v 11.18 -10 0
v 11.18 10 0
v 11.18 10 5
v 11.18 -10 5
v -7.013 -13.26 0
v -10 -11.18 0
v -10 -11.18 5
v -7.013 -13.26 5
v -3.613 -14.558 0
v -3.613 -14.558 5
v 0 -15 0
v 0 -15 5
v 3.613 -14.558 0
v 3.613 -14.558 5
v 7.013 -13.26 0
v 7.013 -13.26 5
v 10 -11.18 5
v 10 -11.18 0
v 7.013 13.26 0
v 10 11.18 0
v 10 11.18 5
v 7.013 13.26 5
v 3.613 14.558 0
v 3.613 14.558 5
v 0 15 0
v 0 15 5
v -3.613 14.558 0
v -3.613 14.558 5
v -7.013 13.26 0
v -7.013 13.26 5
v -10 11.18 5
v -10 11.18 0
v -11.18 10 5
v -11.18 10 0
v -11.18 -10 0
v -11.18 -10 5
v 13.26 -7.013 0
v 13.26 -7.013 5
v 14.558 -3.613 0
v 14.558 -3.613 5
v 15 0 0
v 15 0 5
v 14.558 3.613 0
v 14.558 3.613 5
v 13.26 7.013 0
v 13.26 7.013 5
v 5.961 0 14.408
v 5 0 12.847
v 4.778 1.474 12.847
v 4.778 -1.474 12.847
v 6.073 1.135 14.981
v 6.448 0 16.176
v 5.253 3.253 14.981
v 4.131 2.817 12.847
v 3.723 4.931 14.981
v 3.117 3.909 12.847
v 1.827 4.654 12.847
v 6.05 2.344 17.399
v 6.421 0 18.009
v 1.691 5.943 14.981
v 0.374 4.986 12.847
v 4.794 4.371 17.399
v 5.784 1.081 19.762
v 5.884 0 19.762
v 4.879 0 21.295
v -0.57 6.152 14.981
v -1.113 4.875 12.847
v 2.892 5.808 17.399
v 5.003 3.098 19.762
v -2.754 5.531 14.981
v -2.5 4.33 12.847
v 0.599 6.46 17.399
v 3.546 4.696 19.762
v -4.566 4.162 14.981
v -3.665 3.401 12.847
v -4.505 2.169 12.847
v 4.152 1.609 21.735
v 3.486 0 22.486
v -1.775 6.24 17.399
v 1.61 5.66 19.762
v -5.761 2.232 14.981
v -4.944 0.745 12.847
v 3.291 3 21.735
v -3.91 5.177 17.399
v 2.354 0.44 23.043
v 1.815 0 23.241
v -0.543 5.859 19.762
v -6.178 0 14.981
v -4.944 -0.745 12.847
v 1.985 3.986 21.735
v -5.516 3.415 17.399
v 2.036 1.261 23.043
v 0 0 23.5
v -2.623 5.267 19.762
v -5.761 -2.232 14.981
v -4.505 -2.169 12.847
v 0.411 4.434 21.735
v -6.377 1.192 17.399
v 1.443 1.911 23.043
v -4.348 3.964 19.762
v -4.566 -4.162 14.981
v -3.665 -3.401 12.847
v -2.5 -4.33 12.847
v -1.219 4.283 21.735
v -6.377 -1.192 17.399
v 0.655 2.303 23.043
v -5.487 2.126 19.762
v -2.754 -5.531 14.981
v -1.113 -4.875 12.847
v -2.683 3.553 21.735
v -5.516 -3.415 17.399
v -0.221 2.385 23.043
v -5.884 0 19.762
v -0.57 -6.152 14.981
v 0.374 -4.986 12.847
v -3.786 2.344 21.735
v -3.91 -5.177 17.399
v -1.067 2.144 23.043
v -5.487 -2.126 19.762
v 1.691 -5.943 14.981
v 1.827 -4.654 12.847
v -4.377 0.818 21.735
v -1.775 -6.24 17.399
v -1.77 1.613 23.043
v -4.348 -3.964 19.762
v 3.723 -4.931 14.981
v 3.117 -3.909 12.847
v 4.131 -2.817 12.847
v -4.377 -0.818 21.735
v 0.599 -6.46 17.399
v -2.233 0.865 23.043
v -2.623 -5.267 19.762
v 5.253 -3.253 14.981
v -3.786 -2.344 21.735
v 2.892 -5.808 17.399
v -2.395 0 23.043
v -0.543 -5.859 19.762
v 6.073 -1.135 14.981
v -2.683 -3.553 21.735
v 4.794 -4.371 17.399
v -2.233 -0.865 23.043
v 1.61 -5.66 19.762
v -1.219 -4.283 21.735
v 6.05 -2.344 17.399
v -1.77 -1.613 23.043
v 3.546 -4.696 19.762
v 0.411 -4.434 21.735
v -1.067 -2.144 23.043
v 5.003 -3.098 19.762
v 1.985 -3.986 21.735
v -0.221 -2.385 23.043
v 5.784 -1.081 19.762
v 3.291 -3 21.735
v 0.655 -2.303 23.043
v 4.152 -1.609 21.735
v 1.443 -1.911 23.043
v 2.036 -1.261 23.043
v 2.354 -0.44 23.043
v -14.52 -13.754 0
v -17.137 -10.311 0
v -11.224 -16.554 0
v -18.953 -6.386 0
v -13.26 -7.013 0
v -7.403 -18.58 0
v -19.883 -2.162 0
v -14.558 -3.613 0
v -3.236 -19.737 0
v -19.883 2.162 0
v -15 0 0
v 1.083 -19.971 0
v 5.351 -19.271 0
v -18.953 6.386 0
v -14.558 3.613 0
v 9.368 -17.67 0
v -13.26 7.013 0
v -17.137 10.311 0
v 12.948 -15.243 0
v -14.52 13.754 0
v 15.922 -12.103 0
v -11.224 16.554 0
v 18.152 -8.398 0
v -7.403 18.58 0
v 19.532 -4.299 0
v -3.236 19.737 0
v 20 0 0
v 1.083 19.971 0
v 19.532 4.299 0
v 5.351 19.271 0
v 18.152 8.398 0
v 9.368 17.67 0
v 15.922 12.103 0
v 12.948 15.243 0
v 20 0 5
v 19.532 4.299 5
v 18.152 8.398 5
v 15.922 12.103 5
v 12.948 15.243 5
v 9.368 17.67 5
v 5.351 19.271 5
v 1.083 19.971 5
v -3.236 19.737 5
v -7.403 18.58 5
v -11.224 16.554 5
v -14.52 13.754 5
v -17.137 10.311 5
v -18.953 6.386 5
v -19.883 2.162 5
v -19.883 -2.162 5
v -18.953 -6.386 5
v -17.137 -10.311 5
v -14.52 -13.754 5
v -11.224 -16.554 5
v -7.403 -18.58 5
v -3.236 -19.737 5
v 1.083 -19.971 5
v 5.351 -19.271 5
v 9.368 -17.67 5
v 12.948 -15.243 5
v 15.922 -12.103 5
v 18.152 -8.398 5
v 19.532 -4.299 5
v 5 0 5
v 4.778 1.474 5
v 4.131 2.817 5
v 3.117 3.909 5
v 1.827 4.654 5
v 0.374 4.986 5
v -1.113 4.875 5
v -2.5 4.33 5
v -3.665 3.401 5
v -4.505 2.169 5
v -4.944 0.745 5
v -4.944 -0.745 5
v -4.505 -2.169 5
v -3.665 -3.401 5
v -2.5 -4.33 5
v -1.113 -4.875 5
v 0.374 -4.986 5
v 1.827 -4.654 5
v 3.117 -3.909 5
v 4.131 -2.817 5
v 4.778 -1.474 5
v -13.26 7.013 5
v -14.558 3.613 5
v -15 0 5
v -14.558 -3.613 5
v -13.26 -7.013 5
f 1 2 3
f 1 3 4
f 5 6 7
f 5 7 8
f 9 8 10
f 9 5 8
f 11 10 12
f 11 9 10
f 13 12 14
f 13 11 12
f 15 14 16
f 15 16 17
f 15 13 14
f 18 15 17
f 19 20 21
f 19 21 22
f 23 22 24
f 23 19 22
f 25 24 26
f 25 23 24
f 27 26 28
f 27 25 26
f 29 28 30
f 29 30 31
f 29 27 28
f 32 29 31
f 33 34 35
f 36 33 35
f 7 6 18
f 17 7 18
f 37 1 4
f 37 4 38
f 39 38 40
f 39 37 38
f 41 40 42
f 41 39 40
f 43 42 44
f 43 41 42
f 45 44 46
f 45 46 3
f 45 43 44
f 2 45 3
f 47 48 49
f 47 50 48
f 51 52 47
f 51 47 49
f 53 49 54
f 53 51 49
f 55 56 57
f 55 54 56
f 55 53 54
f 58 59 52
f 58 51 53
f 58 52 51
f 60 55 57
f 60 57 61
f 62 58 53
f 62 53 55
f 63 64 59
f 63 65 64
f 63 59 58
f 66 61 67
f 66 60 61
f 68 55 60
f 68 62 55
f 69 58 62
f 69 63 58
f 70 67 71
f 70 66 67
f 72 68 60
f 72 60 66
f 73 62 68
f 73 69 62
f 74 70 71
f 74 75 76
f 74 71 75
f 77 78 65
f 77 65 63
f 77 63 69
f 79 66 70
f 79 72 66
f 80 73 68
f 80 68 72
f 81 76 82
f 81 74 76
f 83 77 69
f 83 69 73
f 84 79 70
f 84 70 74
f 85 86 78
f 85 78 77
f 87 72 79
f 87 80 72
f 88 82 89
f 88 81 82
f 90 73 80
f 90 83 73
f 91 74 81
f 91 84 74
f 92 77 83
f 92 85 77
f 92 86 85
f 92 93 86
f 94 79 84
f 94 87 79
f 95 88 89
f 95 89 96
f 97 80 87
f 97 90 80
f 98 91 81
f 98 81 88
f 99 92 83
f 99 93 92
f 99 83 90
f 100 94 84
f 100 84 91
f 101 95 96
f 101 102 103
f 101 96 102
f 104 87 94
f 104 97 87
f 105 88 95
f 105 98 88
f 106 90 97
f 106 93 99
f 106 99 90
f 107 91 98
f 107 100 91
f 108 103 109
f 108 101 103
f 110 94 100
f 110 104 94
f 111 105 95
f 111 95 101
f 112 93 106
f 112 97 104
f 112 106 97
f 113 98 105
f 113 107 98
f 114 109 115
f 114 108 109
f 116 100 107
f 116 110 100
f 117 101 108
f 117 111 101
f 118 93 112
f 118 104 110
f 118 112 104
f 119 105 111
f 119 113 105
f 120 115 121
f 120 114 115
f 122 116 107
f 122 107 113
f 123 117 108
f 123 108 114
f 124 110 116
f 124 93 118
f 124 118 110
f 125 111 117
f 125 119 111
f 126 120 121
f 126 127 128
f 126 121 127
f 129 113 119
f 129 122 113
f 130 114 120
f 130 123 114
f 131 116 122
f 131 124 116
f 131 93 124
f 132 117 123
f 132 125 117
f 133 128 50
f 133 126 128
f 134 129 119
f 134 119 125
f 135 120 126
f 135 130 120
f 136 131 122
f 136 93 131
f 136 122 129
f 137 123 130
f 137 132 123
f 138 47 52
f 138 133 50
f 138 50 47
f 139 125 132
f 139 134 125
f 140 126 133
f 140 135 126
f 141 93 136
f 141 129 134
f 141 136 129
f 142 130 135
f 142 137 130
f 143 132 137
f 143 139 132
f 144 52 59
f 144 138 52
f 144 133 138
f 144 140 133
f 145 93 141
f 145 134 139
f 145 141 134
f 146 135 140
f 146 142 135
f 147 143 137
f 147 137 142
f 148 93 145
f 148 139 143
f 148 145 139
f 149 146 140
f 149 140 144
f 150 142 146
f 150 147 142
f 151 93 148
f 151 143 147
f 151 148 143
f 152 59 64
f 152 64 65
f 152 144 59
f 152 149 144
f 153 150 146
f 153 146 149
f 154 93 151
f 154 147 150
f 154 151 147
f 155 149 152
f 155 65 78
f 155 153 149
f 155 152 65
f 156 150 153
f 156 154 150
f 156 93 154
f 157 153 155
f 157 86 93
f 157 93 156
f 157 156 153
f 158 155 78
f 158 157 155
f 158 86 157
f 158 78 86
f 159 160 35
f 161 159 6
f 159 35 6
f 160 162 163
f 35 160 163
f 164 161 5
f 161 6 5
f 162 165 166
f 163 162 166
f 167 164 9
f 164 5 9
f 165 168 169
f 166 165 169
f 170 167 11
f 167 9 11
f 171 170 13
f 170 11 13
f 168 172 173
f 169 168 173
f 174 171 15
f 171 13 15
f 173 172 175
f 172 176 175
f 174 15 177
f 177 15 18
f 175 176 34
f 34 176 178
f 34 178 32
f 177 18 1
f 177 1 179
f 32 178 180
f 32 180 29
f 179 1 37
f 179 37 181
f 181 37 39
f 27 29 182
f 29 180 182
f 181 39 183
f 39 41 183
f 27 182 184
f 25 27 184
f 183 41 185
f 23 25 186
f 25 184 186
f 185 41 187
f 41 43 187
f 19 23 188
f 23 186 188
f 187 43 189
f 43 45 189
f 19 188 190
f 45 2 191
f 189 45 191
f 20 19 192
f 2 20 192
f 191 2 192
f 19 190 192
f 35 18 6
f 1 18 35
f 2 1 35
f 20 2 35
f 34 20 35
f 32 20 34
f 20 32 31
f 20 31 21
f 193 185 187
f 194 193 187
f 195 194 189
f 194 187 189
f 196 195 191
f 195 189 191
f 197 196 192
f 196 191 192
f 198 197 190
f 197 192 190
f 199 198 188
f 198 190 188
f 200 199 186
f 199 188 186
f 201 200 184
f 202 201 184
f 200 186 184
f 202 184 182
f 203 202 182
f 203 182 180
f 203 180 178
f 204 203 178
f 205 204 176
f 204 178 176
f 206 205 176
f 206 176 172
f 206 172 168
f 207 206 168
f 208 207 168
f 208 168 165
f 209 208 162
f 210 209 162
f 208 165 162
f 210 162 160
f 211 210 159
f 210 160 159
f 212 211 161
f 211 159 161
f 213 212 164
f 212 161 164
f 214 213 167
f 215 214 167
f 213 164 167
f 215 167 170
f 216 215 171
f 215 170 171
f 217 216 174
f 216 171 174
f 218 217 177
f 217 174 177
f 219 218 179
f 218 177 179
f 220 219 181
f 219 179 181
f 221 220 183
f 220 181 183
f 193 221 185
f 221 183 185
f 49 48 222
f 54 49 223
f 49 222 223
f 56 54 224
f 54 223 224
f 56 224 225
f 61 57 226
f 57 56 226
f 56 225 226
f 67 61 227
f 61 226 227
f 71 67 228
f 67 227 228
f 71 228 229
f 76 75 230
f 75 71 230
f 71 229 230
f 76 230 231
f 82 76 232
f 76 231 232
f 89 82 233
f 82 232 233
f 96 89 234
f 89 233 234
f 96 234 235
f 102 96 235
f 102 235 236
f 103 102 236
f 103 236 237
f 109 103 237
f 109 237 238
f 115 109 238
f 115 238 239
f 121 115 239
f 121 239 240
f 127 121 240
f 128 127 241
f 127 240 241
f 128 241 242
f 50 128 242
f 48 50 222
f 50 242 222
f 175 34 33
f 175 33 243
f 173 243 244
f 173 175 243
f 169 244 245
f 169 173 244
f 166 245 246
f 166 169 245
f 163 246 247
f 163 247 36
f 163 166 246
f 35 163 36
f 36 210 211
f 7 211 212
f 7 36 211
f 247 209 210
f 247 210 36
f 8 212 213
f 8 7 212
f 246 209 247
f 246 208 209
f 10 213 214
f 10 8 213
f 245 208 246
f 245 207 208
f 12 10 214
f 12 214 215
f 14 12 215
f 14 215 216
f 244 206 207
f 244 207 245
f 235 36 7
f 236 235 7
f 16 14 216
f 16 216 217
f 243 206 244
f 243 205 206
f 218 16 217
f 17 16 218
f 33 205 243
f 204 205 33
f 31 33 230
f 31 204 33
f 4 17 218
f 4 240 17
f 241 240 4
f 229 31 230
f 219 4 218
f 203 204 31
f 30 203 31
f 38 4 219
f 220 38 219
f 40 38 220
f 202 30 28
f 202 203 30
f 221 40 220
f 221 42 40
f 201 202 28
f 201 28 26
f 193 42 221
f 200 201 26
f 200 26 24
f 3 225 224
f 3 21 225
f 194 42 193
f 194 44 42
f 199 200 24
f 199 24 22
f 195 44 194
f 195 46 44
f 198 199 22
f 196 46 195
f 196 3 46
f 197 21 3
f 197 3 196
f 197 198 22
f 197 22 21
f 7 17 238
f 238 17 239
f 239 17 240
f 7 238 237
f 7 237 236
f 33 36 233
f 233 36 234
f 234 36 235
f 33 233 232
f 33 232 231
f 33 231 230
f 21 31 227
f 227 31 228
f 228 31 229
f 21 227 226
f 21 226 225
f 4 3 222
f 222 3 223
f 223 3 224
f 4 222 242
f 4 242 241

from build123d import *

# Parameters (mm, degrees)
SKETCH001_R       = 20
PAD001_DEPTH      = 5
CYLINDER012_R     = 5
CYLINDER012_DEPTH = 15


with BuildPart() as pad001:
    # Sketch001 → Pad001 (new body)
    with BuildSketch(Plane.XY):
        Circle(SKETCH001_R)
        with BuildLine():
            ThreePointArc((11.18034, -10), (15, 0), (11.18034, 10))
            Line((11.18034, 10), (11.18034, -10))
        make_face(mode=Mode.SUBTRACT)
        with BuildLine():
            ThreePointArc((-11.18034, 10), (-15, 0), (-11.18034, -10))
            Line((-11.18034, 10), (-11.18034, -10))
        make_face(mode=Mode.SUBTRACT)
        with BuildLine():
            ThreePointArc((10, 11.18034), (0, 15), (-10, 11.18034))
            Line((-10, 11.18034), (10, 11.18034))
        make_face(mode=Mode.SUBTRACT)
        with BuildLine():
            ThreePointArc((-10, -11.18034), (0, -15), (10, -11.18034))
            Line((-10, -11.18034), (10, -11.18034))
        make_face(mode=Mode.SUBTRACT)
    extrude(amount=PAD001_DEPTH)


with BuildPart() as sphere001:
    # Sphere001 → Sphere001 (revolve)
    with BuildSketch(Plane(origin=(0, 0, 17), x_dir=(1, 0, 0), z_dir=(0, -1, 0))):
        with BuildLine():
            ThreePointArc((0, -6.5), (6.5, 0), (0, 6.5))
            Line((0, 6.5), (0, -6.5))
        make_face()
    revolve(axis=Axis((0, 0, 17), (0, 0, 1)))


with BuildPart() as piezacirculo:
    # Cylinder012 → Cylinder012 (new body)
    with BuildSketch(Plane.XY):
        Circle(CYLINDER012_R)
    extrude(amount=CYLINDER012_DEPTH)

    # Fusion018: union Pad001, Sphere001
    add(pad001.part)
    add(sphere001.part)


solid = piezacirculo.part
